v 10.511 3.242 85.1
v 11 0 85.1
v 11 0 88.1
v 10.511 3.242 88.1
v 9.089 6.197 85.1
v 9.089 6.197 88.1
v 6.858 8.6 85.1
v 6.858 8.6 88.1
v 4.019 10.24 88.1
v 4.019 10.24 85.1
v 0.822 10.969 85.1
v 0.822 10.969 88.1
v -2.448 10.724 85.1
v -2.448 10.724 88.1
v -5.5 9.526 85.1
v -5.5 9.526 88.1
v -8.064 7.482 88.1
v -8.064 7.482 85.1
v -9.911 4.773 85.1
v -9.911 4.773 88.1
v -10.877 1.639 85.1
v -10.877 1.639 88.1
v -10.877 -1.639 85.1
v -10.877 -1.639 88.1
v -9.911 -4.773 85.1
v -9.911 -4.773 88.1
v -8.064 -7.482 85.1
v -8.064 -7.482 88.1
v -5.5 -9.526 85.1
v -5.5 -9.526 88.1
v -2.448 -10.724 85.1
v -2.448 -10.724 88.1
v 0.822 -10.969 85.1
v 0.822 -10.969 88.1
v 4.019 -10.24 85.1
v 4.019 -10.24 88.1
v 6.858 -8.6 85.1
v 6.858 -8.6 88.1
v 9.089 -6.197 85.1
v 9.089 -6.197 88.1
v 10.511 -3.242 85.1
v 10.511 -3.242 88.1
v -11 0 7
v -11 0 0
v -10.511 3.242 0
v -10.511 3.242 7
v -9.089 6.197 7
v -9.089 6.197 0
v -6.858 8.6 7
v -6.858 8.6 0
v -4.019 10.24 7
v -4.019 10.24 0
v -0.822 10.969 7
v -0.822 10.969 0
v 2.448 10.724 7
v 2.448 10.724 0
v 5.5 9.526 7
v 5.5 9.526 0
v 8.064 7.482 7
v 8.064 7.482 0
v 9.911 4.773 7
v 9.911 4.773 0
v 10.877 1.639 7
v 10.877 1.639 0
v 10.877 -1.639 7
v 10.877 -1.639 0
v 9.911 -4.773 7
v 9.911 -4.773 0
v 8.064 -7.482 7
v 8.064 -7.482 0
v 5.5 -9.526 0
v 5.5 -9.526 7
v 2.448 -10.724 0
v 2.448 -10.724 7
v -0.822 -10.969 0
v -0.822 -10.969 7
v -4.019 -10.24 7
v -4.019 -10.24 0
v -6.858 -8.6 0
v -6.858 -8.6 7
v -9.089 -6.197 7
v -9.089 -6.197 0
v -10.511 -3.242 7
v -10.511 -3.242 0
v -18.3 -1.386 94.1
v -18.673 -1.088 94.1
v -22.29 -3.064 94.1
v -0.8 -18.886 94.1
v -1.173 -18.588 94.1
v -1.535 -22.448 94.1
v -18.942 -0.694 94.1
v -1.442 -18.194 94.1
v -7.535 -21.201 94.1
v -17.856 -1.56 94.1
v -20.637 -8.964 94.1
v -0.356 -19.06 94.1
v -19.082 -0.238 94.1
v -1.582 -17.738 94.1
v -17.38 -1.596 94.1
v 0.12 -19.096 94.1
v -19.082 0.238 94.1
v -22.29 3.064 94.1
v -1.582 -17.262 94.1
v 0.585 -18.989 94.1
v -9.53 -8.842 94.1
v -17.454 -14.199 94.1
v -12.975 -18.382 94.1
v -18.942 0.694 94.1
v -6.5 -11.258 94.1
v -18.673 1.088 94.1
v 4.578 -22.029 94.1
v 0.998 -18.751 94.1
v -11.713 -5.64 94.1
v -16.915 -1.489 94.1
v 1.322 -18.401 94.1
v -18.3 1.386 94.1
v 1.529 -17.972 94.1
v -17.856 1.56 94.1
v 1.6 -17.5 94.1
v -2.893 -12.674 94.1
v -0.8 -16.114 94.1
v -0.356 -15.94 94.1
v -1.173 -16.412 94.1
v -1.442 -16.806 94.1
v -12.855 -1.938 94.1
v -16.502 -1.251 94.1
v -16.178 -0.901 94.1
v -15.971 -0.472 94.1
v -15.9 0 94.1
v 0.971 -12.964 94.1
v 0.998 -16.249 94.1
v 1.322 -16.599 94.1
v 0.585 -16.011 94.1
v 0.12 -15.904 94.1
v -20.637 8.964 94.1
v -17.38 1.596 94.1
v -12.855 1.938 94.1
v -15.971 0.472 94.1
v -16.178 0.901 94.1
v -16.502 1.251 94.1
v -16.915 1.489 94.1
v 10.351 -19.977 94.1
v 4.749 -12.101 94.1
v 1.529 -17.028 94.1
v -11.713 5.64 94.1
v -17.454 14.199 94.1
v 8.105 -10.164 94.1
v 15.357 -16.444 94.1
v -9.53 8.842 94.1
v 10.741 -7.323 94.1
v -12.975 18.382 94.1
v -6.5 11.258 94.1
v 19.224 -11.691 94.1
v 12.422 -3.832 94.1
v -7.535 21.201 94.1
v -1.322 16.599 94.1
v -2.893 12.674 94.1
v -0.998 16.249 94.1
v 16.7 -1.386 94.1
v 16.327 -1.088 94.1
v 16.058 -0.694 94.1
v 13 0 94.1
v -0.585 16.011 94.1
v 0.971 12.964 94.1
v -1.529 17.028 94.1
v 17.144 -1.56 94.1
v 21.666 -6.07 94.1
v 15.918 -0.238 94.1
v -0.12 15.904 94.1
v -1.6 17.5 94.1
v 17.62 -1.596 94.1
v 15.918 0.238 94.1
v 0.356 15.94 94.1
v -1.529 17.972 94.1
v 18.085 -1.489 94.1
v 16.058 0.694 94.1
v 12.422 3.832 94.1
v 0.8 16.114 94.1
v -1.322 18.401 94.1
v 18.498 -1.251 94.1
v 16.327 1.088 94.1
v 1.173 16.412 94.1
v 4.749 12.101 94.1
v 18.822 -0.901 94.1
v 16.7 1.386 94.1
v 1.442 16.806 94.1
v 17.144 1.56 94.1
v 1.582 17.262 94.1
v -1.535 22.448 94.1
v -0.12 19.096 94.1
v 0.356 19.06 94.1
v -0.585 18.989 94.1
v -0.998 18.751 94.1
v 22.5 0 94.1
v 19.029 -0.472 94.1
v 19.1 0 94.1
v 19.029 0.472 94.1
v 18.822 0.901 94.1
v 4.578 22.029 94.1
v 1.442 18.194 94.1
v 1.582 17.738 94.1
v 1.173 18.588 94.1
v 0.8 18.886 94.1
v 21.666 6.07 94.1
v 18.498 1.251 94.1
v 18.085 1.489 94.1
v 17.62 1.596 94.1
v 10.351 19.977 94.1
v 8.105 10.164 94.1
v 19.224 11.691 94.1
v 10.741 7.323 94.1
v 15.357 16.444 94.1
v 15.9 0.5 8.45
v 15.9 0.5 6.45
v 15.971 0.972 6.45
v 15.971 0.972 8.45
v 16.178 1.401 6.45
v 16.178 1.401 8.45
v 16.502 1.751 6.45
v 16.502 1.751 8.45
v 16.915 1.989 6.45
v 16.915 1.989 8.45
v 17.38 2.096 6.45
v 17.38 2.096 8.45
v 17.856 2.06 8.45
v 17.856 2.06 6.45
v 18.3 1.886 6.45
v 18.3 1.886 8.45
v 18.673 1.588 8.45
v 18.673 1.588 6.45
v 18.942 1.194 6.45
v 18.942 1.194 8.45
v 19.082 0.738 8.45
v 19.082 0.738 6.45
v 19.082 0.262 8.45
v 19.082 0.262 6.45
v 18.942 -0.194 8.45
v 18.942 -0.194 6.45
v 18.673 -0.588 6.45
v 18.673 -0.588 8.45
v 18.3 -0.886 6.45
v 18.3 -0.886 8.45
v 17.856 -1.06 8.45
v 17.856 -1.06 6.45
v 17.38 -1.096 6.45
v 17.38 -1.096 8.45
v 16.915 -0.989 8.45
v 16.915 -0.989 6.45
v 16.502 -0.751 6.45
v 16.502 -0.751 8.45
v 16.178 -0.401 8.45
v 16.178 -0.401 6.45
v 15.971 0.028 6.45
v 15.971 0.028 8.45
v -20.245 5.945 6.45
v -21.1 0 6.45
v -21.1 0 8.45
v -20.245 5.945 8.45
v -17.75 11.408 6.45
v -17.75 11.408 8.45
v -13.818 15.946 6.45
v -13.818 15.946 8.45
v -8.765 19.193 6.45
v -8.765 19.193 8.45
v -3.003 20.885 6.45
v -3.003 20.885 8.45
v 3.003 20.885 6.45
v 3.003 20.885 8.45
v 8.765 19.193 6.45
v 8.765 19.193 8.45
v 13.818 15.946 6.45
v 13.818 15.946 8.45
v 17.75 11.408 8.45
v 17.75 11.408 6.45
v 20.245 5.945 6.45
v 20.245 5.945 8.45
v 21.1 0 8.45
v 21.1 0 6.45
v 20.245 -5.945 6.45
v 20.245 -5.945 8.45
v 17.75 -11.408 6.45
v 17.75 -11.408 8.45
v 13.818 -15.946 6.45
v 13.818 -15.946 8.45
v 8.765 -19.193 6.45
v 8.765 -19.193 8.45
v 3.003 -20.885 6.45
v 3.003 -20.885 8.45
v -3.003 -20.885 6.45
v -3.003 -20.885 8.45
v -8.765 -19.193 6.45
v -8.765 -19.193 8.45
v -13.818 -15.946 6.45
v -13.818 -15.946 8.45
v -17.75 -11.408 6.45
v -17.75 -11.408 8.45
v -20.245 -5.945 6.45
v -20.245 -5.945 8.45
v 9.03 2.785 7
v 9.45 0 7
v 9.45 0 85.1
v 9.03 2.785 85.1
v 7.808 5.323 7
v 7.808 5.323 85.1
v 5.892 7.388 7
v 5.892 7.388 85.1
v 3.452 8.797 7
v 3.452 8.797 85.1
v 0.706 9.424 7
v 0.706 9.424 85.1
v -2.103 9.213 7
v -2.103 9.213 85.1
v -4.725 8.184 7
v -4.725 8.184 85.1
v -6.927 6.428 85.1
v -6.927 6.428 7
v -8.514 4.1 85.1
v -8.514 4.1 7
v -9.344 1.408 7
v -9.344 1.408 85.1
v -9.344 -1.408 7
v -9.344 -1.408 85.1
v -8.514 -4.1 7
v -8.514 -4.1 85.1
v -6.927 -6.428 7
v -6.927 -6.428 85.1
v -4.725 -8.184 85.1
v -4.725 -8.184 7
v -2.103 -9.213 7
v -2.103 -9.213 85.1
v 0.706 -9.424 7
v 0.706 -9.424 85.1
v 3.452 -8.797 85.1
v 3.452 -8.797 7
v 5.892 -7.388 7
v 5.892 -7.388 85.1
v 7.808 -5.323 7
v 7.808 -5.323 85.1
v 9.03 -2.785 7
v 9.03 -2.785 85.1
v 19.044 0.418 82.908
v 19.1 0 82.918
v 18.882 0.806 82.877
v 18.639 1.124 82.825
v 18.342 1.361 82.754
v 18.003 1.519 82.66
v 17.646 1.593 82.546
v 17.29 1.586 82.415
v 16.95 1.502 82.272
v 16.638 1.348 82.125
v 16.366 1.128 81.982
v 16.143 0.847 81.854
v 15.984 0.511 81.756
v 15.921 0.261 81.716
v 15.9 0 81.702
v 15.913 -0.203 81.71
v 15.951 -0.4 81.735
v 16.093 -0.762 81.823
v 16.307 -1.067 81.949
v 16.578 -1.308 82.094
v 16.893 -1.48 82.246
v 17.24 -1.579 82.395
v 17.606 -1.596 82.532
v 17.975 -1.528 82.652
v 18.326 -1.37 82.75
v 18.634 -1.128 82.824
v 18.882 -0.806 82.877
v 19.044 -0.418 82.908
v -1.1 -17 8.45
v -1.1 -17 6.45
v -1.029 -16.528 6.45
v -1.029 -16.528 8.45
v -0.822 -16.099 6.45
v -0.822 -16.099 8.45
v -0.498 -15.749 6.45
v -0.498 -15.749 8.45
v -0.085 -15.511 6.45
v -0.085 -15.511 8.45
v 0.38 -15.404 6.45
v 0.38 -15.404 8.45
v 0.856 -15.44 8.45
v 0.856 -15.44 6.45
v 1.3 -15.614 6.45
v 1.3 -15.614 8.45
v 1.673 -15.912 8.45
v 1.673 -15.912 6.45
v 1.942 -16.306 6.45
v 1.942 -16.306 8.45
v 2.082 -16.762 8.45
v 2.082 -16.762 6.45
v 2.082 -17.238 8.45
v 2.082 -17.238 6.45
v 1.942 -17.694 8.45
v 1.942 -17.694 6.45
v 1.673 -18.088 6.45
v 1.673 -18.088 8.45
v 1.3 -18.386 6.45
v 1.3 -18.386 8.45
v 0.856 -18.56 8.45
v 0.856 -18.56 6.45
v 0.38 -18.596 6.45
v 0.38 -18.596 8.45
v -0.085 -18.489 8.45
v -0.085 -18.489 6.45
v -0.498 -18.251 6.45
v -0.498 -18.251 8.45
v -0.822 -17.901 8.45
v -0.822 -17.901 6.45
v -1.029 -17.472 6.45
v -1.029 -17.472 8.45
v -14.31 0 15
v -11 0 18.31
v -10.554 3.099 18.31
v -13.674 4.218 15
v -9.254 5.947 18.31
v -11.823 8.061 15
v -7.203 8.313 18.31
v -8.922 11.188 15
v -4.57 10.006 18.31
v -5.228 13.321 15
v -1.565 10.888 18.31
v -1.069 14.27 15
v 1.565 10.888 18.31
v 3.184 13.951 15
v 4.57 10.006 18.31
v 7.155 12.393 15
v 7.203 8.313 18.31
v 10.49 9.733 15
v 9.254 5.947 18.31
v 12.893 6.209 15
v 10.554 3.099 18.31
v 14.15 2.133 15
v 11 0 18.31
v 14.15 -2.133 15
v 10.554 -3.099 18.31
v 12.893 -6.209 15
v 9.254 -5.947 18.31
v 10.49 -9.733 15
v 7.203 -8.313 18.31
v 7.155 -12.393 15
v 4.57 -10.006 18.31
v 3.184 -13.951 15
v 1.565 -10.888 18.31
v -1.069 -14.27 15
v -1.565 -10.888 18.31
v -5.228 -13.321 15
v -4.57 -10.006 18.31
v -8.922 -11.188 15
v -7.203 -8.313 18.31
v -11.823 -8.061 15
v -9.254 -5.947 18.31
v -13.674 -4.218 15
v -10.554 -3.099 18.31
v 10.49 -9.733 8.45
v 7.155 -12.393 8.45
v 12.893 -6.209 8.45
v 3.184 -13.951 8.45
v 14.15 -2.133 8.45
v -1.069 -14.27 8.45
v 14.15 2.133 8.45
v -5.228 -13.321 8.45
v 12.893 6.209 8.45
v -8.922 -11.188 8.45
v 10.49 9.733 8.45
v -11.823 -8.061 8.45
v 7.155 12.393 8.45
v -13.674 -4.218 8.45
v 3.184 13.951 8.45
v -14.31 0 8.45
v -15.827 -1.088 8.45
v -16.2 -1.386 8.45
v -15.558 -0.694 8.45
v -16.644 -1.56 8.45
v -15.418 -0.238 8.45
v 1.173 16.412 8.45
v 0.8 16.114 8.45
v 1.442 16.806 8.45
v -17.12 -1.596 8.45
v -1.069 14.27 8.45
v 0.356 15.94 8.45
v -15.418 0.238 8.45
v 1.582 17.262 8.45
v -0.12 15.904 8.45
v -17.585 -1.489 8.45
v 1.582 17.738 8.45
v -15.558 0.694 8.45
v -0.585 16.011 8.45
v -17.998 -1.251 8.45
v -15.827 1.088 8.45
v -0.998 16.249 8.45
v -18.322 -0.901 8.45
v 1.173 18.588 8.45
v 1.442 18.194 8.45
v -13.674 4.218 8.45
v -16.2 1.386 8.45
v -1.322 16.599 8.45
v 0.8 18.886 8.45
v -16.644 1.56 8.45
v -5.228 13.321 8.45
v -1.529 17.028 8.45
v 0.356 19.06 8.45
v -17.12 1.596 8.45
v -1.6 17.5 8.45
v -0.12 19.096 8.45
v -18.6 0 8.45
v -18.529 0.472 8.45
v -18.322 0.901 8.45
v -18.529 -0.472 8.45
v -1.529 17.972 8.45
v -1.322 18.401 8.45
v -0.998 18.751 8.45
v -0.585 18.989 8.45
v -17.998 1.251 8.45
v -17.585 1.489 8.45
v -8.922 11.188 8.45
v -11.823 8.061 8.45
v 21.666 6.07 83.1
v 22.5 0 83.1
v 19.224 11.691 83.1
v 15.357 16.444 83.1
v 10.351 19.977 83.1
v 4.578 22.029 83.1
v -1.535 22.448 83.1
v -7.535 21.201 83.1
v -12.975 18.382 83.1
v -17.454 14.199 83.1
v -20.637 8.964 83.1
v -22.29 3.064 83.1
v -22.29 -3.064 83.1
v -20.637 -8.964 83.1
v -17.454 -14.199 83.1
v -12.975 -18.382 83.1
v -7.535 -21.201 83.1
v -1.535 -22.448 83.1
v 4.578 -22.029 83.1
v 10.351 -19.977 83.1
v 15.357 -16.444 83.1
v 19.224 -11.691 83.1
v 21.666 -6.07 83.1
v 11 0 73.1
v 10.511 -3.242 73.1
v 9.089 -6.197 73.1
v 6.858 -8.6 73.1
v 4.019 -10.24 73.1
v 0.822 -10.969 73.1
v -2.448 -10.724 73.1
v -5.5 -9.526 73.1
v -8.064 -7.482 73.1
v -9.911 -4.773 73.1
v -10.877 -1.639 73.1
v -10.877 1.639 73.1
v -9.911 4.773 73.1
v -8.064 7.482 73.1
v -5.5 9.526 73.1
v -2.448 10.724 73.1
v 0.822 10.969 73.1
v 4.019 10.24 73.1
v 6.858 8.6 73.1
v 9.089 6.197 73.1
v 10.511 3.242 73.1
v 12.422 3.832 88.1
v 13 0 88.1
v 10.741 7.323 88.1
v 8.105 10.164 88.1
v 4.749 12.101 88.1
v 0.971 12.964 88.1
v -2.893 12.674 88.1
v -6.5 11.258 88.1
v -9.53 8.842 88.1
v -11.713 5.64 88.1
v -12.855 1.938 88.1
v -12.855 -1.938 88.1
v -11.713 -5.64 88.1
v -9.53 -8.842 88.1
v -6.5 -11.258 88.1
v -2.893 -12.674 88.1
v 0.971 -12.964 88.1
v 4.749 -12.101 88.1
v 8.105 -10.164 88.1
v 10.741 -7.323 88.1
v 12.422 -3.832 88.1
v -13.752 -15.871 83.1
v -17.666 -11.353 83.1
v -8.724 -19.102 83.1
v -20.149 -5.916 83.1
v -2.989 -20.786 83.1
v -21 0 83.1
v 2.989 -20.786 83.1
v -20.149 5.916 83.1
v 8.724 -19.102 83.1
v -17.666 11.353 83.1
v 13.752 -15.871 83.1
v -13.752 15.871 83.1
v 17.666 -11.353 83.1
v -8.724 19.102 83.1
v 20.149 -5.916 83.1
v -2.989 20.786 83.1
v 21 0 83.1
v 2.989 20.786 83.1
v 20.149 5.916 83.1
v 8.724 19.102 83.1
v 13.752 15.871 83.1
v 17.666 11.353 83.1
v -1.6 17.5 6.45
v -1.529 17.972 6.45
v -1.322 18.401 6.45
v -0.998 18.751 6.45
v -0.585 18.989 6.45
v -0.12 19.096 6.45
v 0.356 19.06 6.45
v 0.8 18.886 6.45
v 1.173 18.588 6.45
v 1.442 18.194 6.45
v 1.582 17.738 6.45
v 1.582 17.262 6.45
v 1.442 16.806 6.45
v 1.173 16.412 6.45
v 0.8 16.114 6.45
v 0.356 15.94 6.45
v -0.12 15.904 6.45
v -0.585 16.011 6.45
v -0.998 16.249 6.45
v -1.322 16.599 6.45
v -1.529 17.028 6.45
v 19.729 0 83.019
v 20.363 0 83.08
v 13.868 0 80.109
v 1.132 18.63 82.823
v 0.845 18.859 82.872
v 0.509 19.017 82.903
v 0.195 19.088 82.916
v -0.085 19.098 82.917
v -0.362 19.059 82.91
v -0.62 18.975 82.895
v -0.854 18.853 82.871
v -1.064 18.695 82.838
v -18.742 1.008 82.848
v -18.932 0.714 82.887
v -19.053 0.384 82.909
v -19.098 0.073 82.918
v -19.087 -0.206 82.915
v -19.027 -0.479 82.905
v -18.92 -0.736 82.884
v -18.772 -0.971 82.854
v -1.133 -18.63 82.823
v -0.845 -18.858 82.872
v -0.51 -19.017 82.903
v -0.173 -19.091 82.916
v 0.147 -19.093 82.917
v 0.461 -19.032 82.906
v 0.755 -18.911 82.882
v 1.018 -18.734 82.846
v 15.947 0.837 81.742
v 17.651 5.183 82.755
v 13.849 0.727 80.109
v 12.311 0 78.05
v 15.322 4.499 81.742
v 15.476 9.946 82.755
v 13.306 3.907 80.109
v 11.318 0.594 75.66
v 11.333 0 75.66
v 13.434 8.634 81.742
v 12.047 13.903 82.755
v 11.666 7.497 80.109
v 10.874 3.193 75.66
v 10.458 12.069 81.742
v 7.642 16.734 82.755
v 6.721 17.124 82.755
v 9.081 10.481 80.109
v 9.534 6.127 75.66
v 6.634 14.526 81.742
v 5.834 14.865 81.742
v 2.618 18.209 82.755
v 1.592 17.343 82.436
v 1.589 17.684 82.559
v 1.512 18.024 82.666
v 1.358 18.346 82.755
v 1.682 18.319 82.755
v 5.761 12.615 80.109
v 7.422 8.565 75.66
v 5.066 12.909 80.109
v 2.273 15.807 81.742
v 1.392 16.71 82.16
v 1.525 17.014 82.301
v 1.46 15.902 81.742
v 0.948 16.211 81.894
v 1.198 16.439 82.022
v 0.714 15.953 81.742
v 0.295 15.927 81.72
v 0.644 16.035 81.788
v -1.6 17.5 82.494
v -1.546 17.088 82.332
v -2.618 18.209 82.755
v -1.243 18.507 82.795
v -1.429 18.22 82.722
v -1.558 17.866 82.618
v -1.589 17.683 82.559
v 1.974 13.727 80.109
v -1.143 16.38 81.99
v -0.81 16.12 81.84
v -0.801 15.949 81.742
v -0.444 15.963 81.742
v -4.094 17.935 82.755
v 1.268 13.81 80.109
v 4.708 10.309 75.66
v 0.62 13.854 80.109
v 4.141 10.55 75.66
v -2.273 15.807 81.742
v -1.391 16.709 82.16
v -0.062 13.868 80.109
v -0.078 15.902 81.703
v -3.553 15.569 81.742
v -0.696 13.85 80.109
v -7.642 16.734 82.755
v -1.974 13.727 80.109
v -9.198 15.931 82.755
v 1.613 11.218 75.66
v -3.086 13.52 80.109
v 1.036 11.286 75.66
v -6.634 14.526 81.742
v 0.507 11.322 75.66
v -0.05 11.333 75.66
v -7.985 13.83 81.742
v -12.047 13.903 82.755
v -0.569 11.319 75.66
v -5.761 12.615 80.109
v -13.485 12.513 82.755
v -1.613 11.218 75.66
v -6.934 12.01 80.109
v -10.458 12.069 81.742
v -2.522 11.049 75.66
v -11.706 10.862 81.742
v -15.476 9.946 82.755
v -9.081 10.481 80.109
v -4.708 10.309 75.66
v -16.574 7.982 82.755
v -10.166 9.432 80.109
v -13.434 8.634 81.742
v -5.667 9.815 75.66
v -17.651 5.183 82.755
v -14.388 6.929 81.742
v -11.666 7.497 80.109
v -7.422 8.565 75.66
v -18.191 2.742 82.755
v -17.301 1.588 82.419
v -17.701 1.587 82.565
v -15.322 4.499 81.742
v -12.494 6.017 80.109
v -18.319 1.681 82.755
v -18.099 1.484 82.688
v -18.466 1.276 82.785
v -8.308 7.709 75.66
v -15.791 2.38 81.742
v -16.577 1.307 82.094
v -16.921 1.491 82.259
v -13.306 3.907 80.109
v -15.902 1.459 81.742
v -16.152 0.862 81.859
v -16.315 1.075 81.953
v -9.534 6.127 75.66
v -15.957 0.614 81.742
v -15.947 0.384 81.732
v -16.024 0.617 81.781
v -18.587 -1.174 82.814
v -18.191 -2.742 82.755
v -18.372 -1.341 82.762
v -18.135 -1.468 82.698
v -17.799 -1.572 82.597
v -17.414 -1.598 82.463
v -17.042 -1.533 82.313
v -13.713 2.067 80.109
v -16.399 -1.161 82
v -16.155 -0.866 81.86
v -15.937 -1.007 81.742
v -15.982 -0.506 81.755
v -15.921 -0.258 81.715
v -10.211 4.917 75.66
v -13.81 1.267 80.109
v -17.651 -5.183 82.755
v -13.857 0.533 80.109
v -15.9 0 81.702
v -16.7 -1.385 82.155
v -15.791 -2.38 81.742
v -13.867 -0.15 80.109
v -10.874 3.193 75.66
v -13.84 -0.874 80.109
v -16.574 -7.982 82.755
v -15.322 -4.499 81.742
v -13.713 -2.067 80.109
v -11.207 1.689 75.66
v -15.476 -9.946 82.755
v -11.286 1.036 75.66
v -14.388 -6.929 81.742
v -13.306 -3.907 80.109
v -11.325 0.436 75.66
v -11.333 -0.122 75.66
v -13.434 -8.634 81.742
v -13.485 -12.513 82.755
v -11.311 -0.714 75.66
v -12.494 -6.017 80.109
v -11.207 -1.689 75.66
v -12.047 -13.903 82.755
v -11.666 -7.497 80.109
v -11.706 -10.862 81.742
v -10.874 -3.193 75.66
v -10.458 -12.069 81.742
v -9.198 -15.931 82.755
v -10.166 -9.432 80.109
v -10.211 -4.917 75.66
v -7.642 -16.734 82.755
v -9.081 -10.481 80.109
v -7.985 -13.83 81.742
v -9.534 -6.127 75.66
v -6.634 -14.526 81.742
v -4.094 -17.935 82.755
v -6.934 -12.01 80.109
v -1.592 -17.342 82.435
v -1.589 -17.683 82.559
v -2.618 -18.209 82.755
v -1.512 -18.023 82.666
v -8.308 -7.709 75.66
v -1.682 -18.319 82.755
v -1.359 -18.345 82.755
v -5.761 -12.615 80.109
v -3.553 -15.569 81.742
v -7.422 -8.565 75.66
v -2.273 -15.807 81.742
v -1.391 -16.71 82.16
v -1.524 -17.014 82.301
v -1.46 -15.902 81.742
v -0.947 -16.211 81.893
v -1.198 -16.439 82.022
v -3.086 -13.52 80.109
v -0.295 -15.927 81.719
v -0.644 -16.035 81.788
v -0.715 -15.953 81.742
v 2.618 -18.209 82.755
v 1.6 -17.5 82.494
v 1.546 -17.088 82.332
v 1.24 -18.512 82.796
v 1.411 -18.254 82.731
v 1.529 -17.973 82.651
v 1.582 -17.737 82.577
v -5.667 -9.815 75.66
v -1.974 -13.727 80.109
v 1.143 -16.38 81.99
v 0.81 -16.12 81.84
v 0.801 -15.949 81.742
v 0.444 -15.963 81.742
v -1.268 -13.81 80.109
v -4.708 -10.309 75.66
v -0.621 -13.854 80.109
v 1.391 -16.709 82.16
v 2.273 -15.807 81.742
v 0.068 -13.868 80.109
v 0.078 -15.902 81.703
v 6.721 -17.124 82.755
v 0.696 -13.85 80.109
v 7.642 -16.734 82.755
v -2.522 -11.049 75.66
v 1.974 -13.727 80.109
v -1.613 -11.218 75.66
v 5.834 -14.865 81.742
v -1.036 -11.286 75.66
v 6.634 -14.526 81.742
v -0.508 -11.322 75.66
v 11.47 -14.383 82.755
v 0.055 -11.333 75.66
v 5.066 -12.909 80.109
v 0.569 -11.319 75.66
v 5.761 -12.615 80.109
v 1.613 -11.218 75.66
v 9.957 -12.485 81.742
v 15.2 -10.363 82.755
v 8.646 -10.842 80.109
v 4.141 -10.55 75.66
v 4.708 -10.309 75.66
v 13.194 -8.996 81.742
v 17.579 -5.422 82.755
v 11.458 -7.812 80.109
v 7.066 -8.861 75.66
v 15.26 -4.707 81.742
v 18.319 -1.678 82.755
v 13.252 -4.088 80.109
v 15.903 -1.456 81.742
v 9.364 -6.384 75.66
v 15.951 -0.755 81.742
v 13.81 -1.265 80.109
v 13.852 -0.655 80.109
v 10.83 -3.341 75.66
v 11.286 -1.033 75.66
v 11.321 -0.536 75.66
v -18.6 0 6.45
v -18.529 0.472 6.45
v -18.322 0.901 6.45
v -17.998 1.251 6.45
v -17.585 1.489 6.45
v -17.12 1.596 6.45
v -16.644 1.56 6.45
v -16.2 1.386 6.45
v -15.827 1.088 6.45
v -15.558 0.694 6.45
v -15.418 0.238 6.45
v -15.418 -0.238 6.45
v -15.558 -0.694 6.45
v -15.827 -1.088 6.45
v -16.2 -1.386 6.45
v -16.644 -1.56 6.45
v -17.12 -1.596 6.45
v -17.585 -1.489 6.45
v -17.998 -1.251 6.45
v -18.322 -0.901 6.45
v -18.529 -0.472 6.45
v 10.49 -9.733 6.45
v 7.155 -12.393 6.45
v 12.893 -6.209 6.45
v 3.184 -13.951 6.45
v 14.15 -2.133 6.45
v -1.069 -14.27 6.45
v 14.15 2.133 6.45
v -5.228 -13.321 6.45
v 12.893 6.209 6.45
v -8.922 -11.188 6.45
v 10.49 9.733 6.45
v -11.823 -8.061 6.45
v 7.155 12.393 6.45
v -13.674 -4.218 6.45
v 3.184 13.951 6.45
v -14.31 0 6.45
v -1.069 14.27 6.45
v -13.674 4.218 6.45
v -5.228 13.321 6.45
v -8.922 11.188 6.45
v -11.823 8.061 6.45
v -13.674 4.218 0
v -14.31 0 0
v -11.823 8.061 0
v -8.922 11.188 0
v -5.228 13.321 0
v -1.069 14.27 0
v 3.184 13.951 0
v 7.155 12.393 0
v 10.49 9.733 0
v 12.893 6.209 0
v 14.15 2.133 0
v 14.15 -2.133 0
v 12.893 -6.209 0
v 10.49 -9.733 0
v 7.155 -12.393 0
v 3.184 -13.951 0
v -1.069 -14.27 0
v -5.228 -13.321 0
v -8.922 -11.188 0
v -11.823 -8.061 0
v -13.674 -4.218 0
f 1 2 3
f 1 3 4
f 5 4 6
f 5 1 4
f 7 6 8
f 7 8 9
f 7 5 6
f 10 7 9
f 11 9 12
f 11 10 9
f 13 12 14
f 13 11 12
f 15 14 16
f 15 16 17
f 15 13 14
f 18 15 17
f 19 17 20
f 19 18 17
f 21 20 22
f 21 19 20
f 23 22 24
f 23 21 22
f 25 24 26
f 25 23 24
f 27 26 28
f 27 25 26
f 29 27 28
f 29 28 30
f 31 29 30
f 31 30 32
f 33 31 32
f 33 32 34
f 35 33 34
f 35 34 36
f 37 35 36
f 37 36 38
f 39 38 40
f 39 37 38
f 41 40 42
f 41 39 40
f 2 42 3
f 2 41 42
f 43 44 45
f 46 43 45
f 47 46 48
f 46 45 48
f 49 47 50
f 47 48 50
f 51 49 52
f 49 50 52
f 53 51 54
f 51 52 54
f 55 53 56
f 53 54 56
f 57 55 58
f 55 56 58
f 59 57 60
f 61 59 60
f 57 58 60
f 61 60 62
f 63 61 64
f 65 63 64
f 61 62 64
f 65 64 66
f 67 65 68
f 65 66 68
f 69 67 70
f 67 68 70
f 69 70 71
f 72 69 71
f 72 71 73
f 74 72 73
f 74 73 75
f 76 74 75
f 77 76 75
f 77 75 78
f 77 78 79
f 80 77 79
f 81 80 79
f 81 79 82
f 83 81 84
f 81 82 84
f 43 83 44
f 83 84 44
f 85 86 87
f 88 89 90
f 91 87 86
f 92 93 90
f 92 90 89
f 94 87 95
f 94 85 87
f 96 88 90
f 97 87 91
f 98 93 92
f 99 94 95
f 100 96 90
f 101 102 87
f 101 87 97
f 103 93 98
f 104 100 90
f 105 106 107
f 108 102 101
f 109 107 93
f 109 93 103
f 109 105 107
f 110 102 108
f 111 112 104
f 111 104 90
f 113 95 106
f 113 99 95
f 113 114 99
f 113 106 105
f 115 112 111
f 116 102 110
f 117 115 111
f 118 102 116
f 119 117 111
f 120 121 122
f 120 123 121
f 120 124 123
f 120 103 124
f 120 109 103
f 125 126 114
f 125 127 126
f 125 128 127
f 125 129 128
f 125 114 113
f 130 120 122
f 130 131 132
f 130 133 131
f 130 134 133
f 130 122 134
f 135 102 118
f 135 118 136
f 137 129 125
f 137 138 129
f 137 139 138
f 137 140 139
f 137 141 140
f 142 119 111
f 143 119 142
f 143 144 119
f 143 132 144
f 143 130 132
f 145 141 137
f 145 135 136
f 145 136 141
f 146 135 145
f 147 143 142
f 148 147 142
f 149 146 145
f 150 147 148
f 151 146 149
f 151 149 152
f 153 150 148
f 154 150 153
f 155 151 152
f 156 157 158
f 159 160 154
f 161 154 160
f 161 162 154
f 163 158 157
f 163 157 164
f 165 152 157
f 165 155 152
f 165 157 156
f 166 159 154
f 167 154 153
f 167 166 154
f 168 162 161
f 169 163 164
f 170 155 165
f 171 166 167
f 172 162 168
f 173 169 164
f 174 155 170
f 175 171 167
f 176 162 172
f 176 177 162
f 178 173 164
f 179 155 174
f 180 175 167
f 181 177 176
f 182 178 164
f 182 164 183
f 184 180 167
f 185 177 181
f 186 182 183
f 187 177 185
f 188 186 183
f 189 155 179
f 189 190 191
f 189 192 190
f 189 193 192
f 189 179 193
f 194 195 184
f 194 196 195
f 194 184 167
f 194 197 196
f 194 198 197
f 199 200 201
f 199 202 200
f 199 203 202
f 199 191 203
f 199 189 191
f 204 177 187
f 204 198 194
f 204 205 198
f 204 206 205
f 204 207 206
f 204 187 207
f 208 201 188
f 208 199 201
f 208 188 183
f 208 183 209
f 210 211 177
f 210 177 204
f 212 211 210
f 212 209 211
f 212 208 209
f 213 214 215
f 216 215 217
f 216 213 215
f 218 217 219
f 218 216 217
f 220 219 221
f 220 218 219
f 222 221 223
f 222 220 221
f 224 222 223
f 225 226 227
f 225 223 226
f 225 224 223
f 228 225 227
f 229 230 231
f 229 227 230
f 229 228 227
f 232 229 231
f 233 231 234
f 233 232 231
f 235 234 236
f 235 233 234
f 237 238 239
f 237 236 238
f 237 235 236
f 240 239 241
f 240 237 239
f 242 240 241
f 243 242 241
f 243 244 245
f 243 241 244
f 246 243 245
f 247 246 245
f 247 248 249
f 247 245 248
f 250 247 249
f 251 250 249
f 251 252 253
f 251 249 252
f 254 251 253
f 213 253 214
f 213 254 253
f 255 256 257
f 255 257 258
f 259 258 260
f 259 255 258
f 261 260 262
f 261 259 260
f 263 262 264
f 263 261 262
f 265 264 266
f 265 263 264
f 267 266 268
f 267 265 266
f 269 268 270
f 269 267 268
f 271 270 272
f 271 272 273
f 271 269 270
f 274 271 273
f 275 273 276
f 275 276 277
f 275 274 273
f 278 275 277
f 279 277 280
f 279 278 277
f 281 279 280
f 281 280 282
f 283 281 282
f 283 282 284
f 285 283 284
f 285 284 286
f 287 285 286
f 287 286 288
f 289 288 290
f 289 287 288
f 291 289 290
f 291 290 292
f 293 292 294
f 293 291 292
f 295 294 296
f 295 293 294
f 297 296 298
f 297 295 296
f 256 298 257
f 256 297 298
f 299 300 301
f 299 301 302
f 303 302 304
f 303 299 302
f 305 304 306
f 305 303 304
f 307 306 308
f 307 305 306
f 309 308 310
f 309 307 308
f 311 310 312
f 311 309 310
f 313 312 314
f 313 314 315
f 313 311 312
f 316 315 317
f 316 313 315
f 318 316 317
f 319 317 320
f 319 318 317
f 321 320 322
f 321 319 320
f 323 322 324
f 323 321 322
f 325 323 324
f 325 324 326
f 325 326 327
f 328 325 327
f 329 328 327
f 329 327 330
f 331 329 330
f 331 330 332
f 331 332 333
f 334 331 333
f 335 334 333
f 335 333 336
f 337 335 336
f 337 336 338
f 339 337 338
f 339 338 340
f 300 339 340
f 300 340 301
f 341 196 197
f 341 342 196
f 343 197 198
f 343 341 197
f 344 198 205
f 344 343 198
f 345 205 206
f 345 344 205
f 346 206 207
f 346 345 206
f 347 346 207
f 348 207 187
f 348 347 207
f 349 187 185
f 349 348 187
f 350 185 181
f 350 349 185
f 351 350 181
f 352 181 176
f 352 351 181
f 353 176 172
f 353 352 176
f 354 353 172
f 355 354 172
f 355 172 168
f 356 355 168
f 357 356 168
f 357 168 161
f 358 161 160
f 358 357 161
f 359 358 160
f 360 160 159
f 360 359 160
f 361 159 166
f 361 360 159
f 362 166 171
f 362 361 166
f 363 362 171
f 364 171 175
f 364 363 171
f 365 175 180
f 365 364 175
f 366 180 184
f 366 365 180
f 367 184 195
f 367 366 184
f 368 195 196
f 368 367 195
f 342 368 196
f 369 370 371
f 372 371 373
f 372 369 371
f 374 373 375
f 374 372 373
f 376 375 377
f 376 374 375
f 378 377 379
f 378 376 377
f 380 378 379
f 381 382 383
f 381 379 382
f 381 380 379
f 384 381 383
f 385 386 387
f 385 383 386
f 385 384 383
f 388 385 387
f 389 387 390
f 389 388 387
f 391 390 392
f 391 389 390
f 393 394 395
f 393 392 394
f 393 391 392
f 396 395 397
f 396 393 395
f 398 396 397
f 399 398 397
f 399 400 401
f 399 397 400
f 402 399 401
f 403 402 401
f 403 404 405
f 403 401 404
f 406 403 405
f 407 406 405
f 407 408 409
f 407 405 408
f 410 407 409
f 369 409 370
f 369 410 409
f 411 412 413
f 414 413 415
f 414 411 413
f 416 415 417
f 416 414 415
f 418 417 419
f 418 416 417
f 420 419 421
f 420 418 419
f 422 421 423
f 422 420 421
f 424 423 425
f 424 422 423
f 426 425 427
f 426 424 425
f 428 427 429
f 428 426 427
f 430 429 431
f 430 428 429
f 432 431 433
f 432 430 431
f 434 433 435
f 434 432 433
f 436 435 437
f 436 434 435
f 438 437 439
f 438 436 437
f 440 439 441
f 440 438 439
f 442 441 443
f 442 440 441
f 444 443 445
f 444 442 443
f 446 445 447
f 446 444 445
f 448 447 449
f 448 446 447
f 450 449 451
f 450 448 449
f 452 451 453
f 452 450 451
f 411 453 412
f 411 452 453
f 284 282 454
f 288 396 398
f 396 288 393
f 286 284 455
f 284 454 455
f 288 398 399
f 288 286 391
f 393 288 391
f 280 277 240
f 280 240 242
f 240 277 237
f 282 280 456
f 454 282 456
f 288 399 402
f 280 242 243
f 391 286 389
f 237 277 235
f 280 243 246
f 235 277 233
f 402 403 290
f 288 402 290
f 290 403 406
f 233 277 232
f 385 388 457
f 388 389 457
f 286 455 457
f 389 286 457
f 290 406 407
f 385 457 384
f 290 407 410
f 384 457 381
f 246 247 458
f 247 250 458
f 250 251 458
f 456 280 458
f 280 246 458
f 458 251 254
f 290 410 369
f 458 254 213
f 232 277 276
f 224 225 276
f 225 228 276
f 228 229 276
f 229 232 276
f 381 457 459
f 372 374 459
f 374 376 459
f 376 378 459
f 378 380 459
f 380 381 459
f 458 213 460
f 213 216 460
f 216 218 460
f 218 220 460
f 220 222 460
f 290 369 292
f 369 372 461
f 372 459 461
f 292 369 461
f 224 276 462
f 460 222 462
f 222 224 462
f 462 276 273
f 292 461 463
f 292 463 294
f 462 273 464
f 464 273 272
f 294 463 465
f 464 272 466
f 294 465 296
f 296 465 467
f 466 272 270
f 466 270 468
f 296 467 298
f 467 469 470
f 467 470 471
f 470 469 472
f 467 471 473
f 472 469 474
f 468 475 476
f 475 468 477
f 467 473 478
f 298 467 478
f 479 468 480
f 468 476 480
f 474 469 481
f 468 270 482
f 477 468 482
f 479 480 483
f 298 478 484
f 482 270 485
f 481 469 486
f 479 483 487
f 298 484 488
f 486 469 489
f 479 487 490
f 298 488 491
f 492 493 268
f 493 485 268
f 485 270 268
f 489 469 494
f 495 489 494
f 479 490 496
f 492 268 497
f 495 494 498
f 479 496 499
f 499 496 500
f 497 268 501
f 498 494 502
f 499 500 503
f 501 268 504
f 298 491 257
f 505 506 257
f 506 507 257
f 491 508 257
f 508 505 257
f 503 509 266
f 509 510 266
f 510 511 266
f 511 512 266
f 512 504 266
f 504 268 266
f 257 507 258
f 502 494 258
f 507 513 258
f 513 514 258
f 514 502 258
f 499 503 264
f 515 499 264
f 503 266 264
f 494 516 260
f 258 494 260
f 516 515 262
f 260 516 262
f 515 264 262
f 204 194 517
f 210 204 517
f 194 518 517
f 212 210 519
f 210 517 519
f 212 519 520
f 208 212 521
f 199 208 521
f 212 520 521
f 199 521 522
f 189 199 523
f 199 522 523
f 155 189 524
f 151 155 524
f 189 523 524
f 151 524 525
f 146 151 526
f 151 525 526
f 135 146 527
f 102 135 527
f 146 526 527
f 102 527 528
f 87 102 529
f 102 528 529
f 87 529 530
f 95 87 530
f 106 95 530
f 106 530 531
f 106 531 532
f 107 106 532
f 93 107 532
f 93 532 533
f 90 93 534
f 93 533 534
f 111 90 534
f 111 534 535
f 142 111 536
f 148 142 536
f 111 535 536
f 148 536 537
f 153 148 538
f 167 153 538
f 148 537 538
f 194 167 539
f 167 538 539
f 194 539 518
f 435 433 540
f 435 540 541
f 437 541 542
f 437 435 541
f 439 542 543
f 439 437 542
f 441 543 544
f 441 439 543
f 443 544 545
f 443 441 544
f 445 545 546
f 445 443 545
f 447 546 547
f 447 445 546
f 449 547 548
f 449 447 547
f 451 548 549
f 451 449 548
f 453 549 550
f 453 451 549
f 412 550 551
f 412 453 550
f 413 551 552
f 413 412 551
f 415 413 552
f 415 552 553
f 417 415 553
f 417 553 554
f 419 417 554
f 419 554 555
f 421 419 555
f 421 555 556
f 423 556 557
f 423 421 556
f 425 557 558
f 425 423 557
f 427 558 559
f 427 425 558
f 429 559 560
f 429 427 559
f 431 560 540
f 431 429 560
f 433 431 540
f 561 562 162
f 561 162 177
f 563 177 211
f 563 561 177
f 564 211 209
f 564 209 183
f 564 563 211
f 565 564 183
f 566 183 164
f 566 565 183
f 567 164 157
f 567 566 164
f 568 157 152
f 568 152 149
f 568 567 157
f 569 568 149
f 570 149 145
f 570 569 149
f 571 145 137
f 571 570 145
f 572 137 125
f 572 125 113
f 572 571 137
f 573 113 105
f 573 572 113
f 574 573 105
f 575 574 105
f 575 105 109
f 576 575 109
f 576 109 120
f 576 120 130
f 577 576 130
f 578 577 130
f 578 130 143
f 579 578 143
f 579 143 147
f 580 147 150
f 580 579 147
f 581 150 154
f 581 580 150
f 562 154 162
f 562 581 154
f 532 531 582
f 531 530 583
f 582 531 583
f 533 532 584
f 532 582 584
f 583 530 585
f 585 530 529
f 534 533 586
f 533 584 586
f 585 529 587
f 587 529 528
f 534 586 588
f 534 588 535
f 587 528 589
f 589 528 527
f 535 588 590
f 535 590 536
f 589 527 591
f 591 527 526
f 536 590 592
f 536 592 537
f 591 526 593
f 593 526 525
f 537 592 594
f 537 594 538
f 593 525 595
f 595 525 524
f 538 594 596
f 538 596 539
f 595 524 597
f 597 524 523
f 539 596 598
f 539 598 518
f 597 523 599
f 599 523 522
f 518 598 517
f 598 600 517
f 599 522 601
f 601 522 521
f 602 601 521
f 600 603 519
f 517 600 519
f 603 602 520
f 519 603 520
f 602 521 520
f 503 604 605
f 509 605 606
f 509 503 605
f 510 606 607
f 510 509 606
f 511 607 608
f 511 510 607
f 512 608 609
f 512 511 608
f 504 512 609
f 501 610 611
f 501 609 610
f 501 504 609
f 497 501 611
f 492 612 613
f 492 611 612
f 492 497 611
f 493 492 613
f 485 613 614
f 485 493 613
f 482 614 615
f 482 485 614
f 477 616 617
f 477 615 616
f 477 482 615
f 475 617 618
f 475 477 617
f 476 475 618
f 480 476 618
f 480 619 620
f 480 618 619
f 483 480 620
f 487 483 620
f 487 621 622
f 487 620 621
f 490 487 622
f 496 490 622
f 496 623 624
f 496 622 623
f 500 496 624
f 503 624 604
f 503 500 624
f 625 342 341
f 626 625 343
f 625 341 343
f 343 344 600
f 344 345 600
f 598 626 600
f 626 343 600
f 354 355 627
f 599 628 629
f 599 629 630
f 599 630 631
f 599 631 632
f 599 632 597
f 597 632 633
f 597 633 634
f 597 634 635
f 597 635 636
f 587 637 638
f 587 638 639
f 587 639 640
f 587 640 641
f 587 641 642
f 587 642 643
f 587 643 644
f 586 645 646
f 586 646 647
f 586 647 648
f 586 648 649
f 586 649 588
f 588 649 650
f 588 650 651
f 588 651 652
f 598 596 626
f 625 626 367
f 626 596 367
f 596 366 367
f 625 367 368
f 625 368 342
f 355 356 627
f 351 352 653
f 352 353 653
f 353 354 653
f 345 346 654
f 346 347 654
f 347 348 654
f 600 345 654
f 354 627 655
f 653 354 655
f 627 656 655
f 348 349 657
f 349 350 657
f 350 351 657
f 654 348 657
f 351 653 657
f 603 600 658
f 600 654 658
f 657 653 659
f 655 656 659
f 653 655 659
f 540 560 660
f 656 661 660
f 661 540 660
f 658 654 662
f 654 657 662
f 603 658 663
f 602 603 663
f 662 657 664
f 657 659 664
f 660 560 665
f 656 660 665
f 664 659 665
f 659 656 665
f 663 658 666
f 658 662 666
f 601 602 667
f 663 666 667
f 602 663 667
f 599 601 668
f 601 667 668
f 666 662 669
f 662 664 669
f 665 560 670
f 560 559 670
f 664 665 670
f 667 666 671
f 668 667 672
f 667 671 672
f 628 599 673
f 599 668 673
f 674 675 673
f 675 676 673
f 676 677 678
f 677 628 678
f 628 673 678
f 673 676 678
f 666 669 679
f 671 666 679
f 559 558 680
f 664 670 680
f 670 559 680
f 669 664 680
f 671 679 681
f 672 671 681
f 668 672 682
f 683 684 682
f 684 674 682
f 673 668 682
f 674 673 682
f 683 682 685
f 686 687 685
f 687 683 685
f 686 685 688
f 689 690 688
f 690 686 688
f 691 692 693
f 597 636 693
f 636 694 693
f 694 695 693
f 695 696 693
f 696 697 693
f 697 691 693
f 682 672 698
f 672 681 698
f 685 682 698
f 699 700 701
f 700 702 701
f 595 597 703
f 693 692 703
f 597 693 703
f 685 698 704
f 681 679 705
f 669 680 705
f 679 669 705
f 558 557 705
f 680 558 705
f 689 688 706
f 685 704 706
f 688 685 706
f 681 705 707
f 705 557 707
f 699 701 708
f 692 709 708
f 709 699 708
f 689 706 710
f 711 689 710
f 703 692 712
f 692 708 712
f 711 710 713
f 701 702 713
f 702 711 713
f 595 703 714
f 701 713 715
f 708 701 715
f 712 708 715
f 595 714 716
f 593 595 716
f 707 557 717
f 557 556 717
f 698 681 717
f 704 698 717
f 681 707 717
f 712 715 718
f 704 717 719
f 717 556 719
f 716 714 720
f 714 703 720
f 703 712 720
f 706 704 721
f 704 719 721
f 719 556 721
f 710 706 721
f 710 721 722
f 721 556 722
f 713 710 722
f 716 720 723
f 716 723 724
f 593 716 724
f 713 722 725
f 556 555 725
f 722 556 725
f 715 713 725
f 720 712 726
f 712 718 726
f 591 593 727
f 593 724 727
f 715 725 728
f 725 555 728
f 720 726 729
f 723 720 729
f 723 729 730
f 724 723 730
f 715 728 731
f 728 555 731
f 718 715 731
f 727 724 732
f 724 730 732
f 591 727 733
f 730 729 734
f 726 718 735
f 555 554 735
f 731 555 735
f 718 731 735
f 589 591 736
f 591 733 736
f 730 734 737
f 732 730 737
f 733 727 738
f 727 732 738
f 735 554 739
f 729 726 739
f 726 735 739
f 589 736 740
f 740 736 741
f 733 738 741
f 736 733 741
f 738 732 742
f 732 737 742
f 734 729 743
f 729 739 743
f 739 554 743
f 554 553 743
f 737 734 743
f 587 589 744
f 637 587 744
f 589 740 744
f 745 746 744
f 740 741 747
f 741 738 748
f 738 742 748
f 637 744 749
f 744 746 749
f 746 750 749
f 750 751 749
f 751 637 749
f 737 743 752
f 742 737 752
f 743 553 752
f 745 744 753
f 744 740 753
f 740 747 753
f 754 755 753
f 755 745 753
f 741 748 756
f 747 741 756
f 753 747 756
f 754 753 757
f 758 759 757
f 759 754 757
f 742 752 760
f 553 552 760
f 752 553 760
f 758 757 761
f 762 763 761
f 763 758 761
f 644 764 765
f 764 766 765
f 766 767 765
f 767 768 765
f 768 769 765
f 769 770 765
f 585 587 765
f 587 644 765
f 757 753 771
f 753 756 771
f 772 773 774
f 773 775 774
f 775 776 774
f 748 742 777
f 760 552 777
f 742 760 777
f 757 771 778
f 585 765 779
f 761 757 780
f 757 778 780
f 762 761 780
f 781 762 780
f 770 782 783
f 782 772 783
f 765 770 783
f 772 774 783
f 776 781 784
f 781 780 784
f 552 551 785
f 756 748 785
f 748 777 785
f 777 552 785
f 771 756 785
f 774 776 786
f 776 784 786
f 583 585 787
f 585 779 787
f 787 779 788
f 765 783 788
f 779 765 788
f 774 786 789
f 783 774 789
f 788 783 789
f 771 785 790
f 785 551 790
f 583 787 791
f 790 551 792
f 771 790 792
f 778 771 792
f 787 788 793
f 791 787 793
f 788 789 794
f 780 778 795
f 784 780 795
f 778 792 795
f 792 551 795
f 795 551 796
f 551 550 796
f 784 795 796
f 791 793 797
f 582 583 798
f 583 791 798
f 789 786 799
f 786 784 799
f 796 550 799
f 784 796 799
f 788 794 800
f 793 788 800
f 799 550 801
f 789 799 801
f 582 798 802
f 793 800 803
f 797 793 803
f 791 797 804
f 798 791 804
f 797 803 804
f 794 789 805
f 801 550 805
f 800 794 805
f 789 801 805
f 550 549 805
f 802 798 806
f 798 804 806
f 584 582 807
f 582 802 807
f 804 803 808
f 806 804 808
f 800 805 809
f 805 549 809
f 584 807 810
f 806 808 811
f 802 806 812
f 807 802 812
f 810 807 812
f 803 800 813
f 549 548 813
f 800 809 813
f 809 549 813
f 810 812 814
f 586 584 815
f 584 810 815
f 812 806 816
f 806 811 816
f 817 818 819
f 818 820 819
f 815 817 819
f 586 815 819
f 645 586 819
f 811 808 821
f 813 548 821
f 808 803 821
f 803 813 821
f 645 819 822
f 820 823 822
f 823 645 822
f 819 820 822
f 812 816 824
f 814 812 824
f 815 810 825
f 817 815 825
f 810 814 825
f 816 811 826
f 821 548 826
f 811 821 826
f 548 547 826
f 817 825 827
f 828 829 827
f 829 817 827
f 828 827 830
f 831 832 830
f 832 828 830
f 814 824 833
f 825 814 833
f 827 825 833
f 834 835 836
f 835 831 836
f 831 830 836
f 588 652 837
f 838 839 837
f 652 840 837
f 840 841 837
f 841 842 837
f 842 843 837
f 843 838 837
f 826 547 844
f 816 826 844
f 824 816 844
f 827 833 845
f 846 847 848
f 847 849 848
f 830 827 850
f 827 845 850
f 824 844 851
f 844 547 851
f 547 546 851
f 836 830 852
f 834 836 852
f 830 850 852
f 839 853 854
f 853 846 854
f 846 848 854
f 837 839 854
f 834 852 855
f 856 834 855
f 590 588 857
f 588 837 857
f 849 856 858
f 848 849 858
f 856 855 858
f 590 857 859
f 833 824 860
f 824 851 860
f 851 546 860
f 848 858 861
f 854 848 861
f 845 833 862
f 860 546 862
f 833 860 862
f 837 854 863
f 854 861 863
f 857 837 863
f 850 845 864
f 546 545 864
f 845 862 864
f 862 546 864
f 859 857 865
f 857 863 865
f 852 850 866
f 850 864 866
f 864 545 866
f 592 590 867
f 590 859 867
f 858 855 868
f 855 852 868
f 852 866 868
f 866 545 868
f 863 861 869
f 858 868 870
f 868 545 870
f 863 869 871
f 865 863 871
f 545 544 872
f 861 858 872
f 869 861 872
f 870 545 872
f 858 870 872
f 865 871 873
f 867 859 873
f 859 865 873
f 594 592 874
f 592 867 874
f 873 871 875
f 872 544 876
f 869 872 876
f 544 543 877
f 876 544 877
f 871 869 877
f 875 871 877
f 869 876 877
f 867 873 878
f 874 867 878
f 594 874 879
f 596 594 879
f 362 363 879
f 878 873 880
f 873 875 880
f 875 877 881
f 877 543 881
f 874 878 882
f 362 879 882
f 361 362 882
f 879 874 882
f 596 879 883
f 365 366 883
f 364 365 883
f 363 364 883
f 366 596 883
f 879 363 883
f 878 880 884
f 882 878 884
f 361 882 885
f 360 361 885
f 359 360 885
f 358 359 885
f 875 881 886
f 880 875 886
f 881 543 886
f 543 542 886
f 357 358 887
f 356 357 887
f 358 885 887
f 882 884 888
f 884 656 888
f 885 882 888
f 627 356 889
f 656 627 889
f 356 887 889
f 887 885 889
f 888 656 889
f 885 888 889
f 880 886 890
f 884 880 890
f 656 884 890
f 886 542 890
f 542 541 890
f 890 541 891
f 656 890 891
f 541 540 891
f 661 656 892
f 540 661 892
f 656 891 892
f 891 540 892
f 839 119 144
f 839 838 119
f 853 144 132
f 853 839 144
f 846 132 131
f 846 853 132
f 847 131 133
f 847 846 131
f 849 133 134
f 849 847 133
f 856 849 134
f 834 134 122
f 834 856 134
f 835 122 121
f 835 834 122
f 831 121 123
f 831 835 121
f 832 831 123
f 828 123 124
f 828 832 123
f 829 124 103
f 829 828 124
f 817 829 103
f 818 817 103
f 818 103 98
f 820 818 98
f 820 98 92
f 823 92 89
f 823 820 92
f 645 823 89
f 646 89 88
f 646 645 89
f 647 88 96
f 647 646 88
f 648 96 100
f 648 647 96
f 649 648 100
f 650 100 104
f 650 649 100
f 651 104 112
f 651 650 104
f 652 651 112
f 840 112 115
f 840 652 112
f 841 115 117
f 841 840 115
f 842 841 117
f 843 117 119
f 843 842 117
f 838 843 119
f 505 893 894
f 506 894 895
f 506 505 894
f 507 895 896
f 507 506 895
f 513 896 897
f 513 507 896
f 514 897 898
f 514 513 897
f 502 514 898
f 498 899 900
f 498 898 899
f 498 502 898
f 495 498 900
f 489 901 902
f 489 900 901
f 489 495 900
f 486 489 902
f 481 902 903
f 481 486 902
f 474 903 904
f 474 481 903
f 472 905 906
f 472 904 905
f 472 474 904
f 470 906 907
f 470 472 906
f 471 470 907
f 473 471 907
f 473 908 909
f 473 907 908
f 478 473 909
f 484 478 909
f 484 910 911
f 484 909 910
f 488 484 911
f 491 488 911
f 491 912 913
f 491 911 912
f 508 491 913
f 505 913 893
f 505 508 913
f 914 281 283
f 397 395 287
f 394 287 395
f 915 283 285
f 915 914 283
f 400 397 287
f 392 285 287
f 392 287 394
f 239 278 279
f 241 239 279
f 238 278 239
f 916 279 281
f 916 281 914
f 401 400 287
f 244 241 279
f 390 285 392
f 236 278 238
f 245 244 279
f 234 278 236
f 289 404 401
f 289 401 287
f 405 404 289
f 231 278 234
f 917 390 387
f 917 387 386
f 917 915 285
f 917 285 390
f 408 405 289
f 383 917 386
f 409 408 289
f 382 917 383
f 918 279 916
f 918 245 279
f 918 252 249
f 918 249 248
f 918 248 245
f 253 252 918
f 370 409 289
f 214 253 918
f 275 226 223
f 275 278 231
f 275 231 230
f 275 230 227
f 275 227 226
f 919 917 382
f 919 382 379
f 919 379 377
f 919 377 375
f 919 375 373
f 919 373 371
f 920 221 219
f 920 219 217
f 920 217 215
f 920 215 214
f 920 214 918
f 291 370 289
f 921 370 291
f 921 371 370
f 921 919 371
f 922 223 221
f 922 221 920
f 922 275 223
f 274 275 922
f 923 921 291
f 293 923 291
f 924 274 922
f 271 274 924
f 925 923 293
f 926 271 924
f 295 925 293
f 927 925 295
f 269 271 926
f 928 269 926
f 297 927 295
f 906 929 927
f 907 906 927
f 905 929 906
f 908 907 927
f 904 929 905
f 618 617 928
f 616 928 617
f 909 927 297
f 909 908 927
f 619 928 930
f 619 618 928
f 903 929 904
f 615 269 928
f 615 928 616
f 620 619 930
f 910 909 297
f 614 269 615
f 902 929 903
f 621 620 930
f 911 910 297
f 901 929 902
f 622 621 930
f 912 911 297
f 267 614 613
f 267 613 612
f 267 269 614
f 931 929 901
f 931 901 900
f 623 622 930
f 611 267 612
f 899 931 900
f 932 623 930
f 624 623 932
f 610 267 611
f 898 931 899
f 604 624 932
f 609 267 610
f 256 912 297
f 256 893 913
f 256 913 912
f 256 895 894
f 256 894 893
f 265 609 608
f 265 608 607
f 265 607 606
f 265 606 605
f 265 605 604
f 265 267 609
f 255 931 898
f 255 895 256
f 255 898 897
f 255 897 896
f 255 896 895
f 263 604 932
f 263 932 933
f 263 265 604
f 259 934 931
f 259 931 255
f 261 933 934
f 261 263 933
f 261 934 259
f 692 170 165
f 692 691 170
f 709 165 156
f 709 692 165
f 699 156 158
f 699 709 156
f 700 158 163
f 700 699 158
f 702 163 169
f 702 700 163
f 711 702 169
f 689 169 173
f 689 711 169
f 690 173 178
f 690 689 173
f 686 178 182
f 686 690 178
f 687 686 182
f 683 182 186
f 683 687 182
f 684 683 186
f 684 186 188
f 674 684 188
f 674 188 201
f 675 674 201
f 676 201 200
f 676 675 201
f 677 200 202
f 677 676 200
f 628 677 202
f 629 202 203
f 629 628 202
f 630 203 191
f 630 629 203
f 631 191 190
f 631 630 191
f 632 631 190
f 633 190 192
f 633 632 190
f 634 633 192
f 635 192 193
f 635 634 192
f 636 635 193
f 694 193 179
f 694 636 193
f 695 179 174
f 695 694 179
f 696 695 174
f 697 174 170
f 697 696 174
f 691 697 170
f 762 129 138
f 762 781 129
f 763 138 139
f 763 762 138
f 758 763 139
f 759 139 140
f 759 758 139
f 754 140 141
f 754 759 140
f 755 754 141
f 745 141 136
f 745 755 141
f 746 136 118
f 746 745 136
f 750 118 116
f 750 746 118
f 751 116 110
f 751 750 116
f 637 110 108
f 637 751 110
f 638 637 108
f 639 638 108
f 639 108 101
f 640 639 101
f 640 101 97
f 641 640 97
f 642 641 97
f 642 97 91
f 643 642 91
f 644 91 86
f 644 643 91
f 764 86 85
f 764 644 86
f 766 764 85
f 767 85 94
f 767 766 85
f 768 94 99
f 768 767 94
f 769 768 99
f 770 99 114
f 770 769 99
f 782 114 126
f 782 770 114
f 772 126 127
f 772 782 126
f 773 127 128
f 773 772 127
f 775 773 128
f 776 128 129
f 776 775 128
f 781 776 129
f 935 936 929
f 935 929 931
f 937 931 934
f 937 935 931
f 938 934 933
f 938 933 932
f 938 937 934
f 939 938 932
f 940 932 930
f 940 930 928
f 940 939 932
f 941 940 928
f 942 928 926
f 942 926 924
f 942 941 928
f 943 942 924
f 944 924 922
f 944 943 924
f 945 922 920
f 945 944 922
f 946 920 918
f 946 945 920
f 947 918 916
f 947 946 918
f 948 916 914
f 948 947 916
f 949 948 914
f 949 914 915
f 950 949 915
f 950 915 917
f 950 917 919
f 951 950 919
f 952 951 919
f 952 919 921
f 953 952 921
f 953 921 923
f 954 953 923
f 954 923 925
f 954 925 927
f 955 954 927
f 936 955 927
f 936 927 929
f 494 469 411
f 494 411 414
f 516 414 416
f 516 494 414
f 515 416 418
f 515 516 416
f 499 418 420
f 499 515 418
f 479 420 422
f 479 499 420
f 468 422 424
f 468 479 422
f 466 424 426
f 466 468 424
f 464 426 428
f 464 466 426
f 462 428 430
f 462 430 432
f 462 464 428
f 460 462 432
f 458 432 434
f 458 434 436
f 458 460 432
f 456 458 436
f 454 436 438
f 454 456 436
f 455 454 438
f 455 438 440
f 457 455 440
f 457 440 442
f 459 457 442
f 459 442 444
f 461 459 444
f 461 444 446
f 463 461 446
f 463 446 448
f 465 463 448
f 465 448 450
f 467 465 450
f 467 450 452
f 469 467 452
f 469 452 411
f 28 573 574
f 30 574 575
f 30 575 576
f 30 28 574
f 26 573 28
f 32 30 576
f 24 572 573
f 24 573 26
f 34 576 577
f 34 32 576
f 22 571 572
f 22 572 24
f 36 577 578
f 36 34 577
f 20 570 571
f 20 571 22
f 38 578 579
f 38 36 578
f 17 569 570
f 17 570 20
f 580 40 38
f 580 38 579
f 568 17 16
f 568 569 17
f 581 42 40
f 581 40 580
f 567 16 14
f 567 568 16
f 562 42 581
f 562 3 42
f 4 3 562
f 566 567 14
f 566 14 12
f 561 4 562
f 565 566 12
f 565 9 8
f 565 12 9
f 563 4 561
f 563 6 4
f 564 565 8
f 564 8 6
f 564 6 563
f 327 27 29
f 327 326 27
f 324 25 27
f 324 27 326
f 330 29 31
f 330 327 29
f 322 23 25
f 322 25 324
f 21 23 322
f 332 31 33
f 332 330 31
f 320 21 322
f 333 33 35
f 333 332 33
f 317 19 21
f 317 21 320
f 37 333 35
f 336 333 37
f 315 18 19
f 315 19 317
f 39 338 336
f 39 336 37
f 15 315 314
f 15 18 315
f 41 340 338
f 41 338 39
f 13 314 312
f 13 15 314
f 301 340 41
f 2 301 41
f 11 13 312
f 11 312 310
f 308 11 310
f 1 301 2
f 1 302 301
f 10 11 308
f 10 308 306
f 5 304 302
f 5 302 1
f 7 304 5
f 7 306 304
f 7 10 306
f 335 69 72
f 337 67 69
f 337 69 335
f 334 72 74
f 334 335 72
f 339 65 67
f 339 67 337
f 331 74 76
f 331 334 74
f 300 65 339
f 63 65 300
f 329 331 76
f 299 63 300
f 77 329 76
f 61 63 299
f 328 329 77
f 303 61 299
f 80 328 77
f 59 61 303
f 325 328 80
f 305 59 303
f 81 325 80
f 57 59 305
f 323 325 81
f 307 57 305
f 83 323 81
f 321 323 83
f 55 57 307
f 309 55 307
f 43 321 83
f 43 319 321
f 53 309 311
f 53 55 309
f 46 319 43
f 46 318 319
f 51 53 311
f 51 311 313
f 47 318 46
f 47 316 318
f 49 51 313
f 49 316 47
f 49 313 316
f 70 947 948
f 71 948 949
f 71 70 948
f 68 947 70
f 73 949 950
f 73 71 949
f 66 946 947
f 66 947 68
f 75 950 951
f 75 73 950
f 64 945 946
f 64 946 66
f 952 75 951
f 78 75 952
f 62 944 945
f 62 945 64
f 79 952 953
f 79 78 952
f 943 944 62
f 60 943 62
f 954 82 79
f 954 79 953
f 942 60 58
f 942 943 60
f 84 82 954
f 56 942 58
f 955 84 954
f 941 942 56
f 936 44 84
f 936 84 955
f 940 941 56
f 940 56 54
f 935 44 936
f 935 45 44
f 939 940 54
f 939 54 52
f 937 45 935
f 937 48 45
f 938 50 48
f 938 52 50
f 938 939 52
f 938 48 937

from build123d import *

# Parameters (mm, degrees)
SKETCH2_R               = 11
SKETCH2_R_2             = 9.45
BOSS_EXTRUDE2_DEPTH     = 88.1
BOSS_EXTRUDE3_START     = -5
SKETCH3_R               = 22.5
SKETCH3_R_2             = 11
BOSS_EXTRUDE3_DEPTH     = 5
FILLET1_R               = 10
CUT_EXTRUDE1_START      = -3
SKETCH4_R               = 11
SKETCH4_R_2             = 9.45
CUT_EXTRUDE1_DEPTH      = 3
SKETCH7_R               = 14.31
SKETCH7_R_2             = 11
BOSS_EXTRUDE6_DEPTH     = 20
SKETCH8_R               = 11
CUT_EXTRUDE3_DEPTH      = 7
SKETCH10_R              = 21.1
SKETCH10_R_2            = 14.31
BOSS_EXTRUDE8_DEPTH     = 2
CUT_EXTRUDE4_DEPTH      = 88.631173106
CUT_EXTRUDE4_DEPTH_BACK = 2
SKETCH11_R              = 1.6
CHAMFER5_SIZE           = 5
CUT_EXTRUDE5_START      = -10
SKETCH12_R              = 1.6
CUT_EXTRUDE5_DEPTH      = 10
SKETCH13_R              = 22.5
SKETCH13_R_2            = 13
SKETCH13_R_3            = 1.6
BOSS_EXTRUDE9_DEPTH     = 6


with BuildPart() as part:
    # Sketch2 → Boss-Extrude2 (new body)
    with BuildSketch(Plane.XY):
        Circle(SKETCH2_R)
        Circle(SKETCH2_R_2, mode=Mode.SUBTRACT)
    extrude(amount=BOSS_EXTRUDE2_DEPTH)

    # Sketch3 → Boss-Extrude3 (add)
    with BuildSketch(Plane.XY.offset(88.1).offset(BOSS_EXTRUDE3_START)):
        Circle(SKETCH3_R)
        Circle(SKETCH3_R_2, mode=Mode.SUBTRACT)
    extrude(amount=BOSS_EXTRUDE3_DEPTH)

    # Fillet1
    fillet1_edges = [part.edges().sort_by_distance(p)[0] for p in [
        (-11, 0, 83.1),
    ]]
    fillet(fillet1_edges, radius=FILLET1_R)

    # Sketch4 → Cut-Extrude1 (cut)
    with BuildSketch(Plane.XY.offset(88.1).offset(CUT_EXTRUDE1_START)):
        Circle(SKETCH4_R)
        Circle(SKETCH4_R_2, mode=Mode.SUBTRACT)
    extrude(amount=CUT_EXTRUDE1_DEPTH, mode=Mode.SUBTRACT)

    # Sketch7 → Boss-Extrude6 (add)
    with BuildSketch(Plane(origin=(0, 0, 0), x_dir=(-1, 0, 0), z_dir=(0, 0, -1))):
        Circle(SKETCH7_R)
        Circle(SKETCH7_R_2, mode=Mode.SUBTRACT)
    extrude(amount=-BOSS_EXTRUDE6_DEPTH)

    # Sketch8 → Cut-Extrude3 (cut)
    with BuildSketch(Plane(origin=(0, 0, 0), x_dir=(-1, 0, 0), z_dir=(0, 0, -1))):
        Circle(SKETCH8_R)
    extrude(amount=-CUT_EXTRUDE3_DEPTH, mode=Mode.SUBTRACT)

    # Sketch10 → Boss-Extrude8 (add)
    with BuildSketch(Plane(origin=(0, 0, 6.45), x_dir=(-1, 0, 0), z_dir=(0, 0, -1))):
        Circle(SKETCH10_R)
        Circle(SKETCH10_R_2, mode=Mode.SUBTRACT)
    extrude(amount=-BOSS_EXTRUDE8_DEPTH)

    # Sketch11 → Cut-Extrude4 (cut, two sides: drawn at the far end of the back side and taken through both)
    with BuildSketch(Plane(origin=(0, 0, 6.45), x_dir=(-1, 0, 0), z_dir=(0, 0, -1)).offset(-CUT_EXTRUDE4_DEPTH_BACK)):
        with Locations((0, 17.5)):
            Circle(SKETCH11_R)
        with Locations((17, 0)):
            Circle(SKETCH11_R)
        with Locations((-0.5, -17)):
            Circle(SKETCH11_R)
        with Locations((-17.5, 0.5)):
            Circle(SKETCH11_R)
    extrude(amount=CUT_EXTRUDE4_DEPTH + CUT_EXTRUDE4_DEPTH_BACK, mode=Mode.SUBTRACT)

    # Chamfer5
    # the kernel refuses this chamfer: 5 mm, written as the material it takes off along each edge
    with BuildSketch(Plane(origin=(0, 0, 20), x_dir=(-1, 0, 0), z_dir=(0, -1, 0))) as chamfer5_piece_1_section:
        Polygon((14.31 - CHAMFER5_SIZE, 0), (14.31, CHAMFER5_SIZE), (14.31, 0), align=None)
    chamfer5_piece_1 = revolve(axis=Axis((0, 0, 20), (0, 0, -1)), mode=Mode.PRIVATE)
    chamfer5_piece_1 = chamfer5_piece_1 - Plane(origin=(0, 0, 16.654544166), x_dir=(1, 0, 0), z_dir=(0, 0, -1)) * Cylinder(11, 58, mode=Mode.PRIVATE)
    add(chamfer5_piece_1, mode=Mode.SUBTRACT)

    # Sketch12 → Cut-Extrude5 (cut)
    with BuildSketch(Plane.XY.offset(88.1).offset(CUT_EXTRUDE5_START)):
        with Locations(Location((0, 17.5, 0), (0, 0, 180))):
            Circle(SKETCH12_R)
        with Locations((17.5, 0)):
            Circle(SKETCH12_R)
        with Locations((0, -17.5)):
            Circle(SKETCH12_R)
        with Locations((-17.5, 0)):
            Circle(SKETCH12_R)
    extrude(amount=CUT_EXTRUDE5_DEPTH, mode=Mode.SUBTRACT)

    # Sketch13 → Boss-Extrude9 (add)
    with BuildSketch(Plane.XY.offset(88.1)):
        Circle(SKETCH13_R)
        Circle(SKETCH13_R_2, mode=Mode.SUBTRACT)
        with Locations((-17.5, 0)):
            Circle(SKETCH13_R_3, mode=Mode.SUBTRACT)
        with Locations((17.5, 0)):
            Circle(SKETCH13_R_3, mode=Mode.SUBTRACT)
        with Locations((0, -17.5)):
            Circle(SKETCH13_R_3, mode=Mode.SUBTRACT)
        with Locations(Location((0, 17.5, 0), (0, 0, 180))):
            Circle(SKETCH13_R_3, mode=Mode.SUBTRACT)
    extrude(amount=BOSS_EXTRUDE9_DEPTH)


solid = part.part
